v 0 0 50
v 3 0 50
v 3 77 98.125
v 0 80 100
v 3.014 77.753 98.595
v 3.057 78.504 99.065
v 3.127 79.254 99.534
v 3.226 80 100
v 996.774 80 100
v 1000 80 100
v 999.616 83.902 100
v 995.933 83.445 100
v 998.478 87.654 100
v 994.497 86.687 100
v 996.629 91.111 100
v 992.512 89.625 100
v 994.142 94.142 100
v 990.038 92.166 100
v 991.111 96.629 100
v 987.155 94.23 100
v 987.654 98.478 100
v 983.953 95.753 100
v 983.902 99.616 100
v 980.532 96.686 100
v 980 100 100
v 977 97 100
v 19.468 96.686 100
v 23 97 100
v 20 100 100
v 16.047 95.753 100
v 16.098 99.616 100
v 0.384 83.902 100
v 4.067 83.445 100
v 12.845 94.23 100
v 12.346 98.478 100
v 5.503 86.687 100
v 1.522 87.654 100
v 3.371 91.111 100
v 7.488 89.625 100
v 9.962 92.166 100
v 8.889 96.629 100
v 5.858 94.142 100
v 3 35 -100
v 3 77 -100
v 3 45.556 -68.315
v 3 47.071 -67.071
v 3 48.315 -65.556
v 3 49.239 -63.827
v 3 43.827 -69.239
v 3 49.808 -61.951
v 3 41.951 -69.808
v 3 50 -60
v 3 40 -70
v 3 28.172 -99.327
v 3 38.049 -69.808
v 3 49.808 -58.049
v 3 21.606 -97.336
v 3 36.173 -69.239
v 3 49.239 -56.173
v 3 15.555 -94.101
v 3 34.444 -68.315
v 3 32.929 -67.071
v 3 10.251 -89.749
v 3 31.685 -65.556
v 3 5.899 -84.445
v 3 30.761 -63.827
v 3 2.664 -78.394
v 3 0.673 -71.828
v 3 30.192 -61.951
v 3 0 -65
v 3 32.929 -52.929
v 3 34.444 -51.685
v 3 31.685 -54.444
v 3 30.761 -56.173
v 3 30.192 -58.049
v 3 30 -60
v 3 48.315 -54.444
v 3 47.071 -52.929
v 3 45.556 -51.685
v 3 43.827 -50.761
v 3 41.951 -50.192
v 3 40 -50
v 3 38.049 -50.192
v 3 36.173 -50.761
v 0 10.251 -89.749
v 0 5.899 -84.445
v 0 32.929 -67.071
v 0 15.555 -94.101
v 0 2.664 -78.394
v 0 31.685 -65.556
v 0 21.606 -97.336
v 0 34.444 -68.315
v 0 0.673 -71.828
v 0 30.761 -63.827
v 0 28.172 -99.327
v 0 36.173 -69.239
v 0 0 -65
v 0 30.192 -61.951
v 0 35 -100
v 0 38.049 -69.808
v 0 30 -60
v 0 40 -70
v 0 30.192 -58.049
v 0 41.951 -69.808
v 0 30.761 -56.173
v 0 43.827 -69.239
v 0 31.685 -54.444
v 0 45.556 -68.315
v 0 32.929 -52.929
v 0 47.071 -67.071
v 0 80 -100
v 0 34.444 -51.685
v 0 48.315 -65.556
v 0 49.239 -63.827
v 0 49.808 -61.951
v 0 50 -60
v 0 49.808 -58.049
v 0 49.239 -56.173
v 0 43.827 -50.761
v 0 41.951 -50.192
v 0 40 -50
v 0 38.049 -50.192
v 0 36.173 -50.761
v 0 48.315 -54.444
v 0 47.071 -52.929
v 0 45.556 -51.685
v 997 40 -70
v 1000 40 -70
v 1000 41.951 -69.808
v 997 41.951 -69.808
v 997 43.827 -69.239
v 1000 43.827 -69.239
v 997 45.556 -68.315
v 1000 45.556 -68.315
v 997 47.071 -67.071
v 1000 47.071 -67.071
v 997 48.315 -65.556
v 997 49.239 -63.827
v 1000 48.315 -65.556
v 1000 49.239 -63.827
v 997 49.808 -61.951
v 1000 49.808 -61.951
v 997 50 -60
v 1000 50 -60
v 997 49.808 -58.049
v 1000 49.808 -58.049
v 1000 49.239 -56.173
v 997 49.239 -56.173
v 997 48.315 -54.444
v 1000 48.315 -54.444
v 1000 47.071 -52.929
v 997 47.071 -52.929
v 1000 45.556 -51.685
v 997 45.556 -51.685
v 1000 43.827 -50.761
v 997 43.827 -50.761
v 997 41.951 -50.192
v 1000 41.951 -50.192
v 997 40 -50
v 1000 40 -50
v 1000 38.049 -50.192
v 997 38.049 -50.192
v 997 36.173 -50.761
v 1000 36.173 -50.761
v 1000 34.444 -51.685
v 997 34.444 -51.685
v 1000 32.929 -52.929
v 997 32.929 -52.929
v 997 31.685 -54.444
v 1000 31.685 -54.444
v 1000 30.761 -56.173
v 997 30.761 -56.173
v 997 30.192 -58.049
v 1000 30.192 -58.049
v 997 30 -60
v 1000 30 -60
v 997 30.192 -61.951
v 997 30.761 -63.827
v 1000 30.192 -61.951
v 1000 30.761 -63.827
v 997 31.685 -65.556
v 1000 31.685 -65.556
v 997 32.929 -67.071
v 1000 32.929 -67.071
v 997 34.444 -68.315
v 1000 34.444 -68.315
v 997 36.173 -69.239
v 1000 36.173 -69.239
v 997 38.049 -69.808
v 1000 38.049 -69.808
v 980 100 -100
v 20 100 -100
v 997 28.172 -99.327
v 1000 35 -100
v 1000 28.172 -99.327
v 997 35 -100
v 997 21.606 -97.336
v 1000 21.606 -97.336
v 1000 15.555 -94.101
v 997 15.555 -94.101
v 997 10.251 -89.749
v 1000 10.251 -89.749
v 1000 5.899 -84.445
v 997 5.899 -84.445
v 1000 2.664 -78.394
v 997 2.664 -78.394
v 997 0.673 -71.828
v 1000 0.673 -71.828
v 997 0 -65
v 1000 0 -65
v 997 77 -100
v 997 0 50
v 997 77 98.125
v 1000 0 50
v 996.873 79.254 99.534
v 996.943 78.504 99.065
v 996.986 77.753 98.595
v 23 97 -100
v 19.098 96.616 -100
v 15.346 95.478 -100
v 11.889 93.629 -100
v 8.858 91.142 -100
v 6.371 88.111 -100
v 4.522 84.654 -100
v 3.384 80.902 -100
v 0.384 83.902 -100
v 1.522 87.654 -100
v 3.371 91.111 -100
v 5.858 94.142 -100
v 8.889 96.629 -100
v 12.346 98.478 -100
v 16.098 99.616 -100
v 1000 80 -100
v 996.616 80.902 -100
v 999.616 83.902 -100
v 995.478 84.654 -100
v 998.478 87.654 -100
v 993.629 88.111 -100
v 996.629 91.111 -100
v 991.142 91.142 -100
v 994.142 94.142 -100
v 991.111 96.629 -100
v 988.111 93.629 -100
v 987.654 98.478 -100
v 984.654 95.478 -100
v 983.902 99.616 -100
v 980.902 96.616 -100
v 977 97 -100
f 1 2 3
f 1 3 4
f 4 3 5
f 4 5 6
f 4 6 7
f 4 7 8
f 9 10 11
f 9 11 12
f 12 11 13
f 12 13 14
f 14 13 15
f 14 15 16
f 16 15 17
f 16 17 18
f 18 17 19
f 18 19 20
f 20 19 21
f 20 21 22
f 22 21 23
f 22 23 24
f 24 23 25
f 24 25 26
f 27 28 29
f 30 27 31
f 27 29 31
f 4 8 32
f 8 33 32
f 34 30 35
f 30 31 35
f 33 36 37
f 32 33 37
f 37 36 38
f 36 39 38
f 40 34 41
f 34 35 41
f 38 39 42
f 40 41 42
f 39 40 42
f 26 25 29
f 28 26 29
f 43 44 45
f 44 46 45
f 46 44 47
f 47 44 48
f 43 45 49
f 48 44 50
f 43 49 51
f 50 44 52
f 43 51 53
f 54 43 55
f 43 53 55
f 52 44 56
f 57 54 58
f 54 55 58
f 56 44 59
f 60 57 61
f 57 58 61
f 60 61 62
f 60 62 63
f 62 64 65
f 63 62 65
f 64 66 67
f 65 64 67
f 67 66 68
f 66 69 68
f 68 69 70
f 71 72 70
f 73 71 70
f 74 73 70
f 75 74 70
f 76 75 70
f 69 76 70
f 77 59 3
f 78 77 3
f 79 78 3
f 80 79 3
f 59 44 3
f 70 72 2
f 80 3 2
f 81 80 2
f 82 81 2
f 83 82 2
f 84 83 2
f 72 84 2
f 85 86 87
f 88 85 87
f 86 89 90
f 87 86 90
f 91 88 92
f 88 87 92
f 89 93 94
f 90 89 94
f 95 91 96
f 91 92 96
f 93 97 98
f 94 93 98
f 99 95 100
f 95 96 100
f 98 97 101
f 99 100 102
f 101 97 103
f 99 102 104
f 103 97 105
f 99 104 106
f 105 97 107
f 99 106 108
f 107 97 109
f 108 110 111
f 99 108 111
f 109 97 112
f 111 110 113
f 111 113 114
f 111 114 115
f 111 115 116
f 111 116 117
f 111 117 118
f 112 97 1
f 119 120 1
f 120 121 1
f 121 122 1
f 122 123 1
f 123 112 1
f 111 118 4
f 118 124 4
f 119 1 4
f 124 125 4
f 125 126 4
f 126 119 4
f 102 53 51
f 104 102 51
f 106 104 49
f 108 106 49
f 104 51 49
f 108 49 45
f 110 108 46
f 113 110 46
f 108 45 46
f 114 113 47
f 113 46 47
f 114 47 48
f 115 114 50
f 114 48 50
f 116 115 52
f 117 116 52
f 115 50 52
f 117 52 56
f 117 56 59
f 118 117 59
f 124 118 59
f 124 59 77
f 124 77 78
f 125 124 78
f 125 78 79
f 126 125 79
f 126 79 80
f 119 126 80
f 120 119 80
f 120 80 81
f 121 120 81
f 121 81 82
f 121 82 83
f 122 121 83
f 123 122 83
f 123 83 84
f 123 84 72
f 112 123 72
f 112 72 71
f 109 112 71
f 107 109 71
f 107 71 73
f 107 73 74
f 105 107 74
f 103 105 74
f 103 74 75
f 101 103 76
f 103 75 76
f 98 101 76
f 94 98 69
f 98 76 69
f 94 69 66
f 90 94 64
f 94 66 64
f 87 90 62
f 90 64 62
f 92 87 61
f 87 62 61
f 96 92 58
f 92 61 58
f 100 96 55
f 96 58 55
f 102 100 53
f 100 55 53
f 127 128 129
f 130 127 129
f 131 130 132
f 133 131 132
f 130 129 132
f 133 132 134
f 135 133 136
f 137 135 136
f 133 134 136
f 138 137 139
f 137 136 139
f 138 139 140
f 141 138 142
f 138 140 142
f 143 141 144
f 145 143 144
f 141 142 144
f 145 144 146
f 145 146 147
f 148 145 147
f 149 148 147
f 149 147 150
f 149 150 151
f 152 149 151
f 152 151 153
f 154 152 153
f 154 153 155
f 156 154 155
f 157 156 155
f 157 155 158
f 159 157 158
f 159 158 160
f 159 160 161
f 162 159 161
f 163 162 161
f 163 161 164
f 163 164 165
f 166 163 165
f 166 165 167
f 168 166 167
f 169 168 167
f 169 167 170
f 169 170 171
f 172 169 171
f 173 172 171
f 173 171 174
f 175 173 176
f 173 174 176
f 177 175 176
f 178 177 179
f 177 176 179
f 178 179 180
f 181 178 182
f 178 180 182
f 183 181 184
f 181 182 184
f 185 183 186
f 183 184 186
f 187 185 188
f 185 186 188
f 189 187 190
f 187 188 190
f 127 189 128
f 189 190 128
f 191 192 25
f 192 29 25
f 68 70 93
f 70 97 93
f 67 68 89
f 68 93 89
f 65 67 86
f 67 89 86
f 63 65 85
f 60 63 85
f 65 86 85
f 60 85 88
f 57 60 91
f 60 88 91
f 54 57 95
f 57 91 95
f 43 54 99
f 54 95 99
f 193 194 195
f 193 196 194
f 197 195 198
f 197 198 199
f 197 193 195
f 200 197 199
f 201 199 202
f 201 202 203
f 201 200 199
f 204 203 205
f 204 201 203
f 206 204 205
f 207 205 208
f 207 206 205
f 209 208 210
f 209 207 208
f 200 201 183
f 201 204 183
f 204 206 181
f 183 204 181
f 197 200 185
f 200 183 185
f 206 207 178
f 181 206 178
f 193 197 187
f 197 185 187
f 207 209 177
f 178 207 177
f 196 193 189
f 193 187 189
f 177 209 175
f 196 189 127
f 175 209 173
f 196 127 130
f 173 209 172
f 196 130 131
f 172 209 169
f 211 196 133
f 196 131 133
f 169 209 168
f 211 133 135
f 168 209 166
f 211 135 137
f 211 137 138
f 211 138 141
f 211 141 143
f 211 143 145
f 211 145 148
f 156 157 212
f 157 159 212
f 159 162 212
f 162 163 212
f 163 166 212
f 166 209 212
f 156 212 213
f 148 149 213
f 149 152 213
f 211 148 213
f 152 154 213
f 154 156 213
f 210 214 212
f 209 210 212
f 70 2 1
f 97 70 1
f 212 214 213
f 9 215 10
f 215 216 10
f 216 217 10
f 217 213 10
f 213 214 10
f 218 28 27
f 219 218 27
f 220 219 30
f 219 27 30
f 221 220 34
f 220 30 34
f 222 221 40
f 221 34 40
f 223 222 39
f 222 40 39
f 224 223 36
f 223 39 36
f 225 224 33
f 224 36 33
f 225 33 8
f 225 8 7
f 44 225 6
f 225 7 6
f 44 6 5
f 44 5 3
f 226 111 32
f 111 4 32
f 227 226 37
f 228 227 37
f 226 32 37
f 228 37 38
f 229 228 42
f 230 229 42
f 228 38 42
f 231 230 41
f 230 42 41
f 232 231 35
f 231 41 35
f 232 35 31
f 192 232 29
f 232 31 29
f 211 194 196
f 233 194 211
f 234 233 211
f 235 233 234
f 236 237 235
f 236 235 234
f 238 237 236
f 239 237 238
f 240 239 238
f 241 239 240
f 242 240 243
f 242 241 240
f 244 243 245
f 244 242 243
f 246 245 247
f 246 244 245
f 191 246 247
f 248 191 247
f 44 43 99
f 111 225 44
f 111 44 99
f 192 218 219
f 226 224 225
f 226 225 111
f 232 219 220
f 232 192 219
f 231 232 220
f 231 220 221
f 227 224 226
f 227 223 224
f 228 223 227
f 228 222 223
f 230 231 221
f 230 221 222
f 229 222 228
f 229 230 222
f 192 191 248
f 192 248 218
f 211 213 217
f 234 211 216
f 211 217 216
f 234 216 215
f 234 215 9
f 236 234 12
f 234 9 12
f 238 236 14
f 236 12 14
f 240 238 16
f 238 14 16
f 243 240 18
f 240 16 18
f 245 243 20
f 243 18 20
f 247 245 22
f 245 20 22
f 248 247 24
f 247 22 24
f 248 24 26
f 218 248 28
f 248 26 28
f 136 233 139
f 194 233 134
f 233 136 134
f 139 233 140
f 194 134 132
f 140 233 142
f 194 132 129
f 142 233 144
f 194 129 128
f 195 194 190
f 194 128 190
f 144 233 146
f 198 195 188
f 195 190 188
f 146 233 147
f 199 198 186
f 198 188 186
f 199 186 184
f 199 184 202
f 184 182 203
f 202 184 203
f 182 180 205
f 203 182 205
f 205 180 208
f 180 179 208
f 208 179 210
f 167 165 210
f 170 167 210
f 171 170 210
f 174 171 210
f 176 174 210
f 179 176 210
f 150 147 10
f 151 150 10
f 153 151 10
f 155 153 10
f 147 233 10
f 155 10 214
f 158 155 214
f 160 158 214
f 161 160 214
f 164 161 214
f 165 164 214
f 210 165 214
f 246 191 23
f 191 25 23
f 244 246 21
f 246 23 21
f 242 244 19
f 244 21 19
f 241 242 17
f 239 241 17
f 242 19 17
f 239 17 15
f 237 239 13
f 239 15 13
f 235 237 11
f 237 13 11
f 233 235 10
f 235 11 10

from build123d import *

# Parameters (mm, degrees)
BOSS_EXTRUDE1_DEPTH = 100
CUT_EXTRUDE1_DEPTH  = 1001
SKETCH4_R           = 10
CUT_EXTRUDE2_DEPTH  = 1001
FILLET3_R           = 35


with BuildPart() as part:
    # Sketch2 → Boss-Extrude1 (new body, symmetric)
    with BuildSketch(Plane.XY):
        with BuildLine():
            Line((0, 0), (0, 80))
            ThreePointArc((0, 80), (5.857864376, 94.142135624), (20, 100))
            Line((20, 100), (980, 100))
            ThreePointArc((980, 100), (994.142135624, 94.142135624), (1000, 80))
            Line((1000, 80), (1000, 0))
            Line((1000, 0), (997, 0))
            Line((997, 0), (997, 77))
            ThreePointArc((997, 77), (991.142135624, 91.142135624), (977, 97))
            Line((977, 97), (23, 97))
            ThreePointArc((23, 97), (8.857864376, 91.142135624), (3, 77))
            Line((3, 77), (3, 0))
            Line((3, 0), (0, 0))
        make_face()
    extrude(amount=BOSS_EXTRUDE1_DEPTH, both=True)

    # Sketch3 → Cut-Extrude1 (cut, through all)
    with BuildSketch(Plane(origin=(1000, 0, 0), x_dir=(0, 0, -1), z_dir=(1, 0, 0))):
        Polygon((-100, 0), (-50, 0), (-100, 80), align=None)
    extrude(amount=-CUT_EXTRUDE1_DEPTH, mode=Mode.SUBTRACT)

    # Sketch4 → Cut-Extrude2 (cut, through all)
    with BuildSketch(Plane(origin=(1000, 0, 0), x_dir=(0, 0, -1), z_dir=(1, 0, 0))):
        with Locations((60, 40)):
            Circle(SKETCH4_R)
    extrude(amount=-CUT_EXTRUDE2_DEPTH, mode=Mode.SUBTRACT)

    # Fillet3
    fillet3_edges = [part.edges().sort_by_distance(p)[0] for p in [
        (998.5, 0, -100),
        (1.5, 0, -100),
    ]]
    fillet(fillet3_edges, radius=FILLET3_R)


solid = part.part
